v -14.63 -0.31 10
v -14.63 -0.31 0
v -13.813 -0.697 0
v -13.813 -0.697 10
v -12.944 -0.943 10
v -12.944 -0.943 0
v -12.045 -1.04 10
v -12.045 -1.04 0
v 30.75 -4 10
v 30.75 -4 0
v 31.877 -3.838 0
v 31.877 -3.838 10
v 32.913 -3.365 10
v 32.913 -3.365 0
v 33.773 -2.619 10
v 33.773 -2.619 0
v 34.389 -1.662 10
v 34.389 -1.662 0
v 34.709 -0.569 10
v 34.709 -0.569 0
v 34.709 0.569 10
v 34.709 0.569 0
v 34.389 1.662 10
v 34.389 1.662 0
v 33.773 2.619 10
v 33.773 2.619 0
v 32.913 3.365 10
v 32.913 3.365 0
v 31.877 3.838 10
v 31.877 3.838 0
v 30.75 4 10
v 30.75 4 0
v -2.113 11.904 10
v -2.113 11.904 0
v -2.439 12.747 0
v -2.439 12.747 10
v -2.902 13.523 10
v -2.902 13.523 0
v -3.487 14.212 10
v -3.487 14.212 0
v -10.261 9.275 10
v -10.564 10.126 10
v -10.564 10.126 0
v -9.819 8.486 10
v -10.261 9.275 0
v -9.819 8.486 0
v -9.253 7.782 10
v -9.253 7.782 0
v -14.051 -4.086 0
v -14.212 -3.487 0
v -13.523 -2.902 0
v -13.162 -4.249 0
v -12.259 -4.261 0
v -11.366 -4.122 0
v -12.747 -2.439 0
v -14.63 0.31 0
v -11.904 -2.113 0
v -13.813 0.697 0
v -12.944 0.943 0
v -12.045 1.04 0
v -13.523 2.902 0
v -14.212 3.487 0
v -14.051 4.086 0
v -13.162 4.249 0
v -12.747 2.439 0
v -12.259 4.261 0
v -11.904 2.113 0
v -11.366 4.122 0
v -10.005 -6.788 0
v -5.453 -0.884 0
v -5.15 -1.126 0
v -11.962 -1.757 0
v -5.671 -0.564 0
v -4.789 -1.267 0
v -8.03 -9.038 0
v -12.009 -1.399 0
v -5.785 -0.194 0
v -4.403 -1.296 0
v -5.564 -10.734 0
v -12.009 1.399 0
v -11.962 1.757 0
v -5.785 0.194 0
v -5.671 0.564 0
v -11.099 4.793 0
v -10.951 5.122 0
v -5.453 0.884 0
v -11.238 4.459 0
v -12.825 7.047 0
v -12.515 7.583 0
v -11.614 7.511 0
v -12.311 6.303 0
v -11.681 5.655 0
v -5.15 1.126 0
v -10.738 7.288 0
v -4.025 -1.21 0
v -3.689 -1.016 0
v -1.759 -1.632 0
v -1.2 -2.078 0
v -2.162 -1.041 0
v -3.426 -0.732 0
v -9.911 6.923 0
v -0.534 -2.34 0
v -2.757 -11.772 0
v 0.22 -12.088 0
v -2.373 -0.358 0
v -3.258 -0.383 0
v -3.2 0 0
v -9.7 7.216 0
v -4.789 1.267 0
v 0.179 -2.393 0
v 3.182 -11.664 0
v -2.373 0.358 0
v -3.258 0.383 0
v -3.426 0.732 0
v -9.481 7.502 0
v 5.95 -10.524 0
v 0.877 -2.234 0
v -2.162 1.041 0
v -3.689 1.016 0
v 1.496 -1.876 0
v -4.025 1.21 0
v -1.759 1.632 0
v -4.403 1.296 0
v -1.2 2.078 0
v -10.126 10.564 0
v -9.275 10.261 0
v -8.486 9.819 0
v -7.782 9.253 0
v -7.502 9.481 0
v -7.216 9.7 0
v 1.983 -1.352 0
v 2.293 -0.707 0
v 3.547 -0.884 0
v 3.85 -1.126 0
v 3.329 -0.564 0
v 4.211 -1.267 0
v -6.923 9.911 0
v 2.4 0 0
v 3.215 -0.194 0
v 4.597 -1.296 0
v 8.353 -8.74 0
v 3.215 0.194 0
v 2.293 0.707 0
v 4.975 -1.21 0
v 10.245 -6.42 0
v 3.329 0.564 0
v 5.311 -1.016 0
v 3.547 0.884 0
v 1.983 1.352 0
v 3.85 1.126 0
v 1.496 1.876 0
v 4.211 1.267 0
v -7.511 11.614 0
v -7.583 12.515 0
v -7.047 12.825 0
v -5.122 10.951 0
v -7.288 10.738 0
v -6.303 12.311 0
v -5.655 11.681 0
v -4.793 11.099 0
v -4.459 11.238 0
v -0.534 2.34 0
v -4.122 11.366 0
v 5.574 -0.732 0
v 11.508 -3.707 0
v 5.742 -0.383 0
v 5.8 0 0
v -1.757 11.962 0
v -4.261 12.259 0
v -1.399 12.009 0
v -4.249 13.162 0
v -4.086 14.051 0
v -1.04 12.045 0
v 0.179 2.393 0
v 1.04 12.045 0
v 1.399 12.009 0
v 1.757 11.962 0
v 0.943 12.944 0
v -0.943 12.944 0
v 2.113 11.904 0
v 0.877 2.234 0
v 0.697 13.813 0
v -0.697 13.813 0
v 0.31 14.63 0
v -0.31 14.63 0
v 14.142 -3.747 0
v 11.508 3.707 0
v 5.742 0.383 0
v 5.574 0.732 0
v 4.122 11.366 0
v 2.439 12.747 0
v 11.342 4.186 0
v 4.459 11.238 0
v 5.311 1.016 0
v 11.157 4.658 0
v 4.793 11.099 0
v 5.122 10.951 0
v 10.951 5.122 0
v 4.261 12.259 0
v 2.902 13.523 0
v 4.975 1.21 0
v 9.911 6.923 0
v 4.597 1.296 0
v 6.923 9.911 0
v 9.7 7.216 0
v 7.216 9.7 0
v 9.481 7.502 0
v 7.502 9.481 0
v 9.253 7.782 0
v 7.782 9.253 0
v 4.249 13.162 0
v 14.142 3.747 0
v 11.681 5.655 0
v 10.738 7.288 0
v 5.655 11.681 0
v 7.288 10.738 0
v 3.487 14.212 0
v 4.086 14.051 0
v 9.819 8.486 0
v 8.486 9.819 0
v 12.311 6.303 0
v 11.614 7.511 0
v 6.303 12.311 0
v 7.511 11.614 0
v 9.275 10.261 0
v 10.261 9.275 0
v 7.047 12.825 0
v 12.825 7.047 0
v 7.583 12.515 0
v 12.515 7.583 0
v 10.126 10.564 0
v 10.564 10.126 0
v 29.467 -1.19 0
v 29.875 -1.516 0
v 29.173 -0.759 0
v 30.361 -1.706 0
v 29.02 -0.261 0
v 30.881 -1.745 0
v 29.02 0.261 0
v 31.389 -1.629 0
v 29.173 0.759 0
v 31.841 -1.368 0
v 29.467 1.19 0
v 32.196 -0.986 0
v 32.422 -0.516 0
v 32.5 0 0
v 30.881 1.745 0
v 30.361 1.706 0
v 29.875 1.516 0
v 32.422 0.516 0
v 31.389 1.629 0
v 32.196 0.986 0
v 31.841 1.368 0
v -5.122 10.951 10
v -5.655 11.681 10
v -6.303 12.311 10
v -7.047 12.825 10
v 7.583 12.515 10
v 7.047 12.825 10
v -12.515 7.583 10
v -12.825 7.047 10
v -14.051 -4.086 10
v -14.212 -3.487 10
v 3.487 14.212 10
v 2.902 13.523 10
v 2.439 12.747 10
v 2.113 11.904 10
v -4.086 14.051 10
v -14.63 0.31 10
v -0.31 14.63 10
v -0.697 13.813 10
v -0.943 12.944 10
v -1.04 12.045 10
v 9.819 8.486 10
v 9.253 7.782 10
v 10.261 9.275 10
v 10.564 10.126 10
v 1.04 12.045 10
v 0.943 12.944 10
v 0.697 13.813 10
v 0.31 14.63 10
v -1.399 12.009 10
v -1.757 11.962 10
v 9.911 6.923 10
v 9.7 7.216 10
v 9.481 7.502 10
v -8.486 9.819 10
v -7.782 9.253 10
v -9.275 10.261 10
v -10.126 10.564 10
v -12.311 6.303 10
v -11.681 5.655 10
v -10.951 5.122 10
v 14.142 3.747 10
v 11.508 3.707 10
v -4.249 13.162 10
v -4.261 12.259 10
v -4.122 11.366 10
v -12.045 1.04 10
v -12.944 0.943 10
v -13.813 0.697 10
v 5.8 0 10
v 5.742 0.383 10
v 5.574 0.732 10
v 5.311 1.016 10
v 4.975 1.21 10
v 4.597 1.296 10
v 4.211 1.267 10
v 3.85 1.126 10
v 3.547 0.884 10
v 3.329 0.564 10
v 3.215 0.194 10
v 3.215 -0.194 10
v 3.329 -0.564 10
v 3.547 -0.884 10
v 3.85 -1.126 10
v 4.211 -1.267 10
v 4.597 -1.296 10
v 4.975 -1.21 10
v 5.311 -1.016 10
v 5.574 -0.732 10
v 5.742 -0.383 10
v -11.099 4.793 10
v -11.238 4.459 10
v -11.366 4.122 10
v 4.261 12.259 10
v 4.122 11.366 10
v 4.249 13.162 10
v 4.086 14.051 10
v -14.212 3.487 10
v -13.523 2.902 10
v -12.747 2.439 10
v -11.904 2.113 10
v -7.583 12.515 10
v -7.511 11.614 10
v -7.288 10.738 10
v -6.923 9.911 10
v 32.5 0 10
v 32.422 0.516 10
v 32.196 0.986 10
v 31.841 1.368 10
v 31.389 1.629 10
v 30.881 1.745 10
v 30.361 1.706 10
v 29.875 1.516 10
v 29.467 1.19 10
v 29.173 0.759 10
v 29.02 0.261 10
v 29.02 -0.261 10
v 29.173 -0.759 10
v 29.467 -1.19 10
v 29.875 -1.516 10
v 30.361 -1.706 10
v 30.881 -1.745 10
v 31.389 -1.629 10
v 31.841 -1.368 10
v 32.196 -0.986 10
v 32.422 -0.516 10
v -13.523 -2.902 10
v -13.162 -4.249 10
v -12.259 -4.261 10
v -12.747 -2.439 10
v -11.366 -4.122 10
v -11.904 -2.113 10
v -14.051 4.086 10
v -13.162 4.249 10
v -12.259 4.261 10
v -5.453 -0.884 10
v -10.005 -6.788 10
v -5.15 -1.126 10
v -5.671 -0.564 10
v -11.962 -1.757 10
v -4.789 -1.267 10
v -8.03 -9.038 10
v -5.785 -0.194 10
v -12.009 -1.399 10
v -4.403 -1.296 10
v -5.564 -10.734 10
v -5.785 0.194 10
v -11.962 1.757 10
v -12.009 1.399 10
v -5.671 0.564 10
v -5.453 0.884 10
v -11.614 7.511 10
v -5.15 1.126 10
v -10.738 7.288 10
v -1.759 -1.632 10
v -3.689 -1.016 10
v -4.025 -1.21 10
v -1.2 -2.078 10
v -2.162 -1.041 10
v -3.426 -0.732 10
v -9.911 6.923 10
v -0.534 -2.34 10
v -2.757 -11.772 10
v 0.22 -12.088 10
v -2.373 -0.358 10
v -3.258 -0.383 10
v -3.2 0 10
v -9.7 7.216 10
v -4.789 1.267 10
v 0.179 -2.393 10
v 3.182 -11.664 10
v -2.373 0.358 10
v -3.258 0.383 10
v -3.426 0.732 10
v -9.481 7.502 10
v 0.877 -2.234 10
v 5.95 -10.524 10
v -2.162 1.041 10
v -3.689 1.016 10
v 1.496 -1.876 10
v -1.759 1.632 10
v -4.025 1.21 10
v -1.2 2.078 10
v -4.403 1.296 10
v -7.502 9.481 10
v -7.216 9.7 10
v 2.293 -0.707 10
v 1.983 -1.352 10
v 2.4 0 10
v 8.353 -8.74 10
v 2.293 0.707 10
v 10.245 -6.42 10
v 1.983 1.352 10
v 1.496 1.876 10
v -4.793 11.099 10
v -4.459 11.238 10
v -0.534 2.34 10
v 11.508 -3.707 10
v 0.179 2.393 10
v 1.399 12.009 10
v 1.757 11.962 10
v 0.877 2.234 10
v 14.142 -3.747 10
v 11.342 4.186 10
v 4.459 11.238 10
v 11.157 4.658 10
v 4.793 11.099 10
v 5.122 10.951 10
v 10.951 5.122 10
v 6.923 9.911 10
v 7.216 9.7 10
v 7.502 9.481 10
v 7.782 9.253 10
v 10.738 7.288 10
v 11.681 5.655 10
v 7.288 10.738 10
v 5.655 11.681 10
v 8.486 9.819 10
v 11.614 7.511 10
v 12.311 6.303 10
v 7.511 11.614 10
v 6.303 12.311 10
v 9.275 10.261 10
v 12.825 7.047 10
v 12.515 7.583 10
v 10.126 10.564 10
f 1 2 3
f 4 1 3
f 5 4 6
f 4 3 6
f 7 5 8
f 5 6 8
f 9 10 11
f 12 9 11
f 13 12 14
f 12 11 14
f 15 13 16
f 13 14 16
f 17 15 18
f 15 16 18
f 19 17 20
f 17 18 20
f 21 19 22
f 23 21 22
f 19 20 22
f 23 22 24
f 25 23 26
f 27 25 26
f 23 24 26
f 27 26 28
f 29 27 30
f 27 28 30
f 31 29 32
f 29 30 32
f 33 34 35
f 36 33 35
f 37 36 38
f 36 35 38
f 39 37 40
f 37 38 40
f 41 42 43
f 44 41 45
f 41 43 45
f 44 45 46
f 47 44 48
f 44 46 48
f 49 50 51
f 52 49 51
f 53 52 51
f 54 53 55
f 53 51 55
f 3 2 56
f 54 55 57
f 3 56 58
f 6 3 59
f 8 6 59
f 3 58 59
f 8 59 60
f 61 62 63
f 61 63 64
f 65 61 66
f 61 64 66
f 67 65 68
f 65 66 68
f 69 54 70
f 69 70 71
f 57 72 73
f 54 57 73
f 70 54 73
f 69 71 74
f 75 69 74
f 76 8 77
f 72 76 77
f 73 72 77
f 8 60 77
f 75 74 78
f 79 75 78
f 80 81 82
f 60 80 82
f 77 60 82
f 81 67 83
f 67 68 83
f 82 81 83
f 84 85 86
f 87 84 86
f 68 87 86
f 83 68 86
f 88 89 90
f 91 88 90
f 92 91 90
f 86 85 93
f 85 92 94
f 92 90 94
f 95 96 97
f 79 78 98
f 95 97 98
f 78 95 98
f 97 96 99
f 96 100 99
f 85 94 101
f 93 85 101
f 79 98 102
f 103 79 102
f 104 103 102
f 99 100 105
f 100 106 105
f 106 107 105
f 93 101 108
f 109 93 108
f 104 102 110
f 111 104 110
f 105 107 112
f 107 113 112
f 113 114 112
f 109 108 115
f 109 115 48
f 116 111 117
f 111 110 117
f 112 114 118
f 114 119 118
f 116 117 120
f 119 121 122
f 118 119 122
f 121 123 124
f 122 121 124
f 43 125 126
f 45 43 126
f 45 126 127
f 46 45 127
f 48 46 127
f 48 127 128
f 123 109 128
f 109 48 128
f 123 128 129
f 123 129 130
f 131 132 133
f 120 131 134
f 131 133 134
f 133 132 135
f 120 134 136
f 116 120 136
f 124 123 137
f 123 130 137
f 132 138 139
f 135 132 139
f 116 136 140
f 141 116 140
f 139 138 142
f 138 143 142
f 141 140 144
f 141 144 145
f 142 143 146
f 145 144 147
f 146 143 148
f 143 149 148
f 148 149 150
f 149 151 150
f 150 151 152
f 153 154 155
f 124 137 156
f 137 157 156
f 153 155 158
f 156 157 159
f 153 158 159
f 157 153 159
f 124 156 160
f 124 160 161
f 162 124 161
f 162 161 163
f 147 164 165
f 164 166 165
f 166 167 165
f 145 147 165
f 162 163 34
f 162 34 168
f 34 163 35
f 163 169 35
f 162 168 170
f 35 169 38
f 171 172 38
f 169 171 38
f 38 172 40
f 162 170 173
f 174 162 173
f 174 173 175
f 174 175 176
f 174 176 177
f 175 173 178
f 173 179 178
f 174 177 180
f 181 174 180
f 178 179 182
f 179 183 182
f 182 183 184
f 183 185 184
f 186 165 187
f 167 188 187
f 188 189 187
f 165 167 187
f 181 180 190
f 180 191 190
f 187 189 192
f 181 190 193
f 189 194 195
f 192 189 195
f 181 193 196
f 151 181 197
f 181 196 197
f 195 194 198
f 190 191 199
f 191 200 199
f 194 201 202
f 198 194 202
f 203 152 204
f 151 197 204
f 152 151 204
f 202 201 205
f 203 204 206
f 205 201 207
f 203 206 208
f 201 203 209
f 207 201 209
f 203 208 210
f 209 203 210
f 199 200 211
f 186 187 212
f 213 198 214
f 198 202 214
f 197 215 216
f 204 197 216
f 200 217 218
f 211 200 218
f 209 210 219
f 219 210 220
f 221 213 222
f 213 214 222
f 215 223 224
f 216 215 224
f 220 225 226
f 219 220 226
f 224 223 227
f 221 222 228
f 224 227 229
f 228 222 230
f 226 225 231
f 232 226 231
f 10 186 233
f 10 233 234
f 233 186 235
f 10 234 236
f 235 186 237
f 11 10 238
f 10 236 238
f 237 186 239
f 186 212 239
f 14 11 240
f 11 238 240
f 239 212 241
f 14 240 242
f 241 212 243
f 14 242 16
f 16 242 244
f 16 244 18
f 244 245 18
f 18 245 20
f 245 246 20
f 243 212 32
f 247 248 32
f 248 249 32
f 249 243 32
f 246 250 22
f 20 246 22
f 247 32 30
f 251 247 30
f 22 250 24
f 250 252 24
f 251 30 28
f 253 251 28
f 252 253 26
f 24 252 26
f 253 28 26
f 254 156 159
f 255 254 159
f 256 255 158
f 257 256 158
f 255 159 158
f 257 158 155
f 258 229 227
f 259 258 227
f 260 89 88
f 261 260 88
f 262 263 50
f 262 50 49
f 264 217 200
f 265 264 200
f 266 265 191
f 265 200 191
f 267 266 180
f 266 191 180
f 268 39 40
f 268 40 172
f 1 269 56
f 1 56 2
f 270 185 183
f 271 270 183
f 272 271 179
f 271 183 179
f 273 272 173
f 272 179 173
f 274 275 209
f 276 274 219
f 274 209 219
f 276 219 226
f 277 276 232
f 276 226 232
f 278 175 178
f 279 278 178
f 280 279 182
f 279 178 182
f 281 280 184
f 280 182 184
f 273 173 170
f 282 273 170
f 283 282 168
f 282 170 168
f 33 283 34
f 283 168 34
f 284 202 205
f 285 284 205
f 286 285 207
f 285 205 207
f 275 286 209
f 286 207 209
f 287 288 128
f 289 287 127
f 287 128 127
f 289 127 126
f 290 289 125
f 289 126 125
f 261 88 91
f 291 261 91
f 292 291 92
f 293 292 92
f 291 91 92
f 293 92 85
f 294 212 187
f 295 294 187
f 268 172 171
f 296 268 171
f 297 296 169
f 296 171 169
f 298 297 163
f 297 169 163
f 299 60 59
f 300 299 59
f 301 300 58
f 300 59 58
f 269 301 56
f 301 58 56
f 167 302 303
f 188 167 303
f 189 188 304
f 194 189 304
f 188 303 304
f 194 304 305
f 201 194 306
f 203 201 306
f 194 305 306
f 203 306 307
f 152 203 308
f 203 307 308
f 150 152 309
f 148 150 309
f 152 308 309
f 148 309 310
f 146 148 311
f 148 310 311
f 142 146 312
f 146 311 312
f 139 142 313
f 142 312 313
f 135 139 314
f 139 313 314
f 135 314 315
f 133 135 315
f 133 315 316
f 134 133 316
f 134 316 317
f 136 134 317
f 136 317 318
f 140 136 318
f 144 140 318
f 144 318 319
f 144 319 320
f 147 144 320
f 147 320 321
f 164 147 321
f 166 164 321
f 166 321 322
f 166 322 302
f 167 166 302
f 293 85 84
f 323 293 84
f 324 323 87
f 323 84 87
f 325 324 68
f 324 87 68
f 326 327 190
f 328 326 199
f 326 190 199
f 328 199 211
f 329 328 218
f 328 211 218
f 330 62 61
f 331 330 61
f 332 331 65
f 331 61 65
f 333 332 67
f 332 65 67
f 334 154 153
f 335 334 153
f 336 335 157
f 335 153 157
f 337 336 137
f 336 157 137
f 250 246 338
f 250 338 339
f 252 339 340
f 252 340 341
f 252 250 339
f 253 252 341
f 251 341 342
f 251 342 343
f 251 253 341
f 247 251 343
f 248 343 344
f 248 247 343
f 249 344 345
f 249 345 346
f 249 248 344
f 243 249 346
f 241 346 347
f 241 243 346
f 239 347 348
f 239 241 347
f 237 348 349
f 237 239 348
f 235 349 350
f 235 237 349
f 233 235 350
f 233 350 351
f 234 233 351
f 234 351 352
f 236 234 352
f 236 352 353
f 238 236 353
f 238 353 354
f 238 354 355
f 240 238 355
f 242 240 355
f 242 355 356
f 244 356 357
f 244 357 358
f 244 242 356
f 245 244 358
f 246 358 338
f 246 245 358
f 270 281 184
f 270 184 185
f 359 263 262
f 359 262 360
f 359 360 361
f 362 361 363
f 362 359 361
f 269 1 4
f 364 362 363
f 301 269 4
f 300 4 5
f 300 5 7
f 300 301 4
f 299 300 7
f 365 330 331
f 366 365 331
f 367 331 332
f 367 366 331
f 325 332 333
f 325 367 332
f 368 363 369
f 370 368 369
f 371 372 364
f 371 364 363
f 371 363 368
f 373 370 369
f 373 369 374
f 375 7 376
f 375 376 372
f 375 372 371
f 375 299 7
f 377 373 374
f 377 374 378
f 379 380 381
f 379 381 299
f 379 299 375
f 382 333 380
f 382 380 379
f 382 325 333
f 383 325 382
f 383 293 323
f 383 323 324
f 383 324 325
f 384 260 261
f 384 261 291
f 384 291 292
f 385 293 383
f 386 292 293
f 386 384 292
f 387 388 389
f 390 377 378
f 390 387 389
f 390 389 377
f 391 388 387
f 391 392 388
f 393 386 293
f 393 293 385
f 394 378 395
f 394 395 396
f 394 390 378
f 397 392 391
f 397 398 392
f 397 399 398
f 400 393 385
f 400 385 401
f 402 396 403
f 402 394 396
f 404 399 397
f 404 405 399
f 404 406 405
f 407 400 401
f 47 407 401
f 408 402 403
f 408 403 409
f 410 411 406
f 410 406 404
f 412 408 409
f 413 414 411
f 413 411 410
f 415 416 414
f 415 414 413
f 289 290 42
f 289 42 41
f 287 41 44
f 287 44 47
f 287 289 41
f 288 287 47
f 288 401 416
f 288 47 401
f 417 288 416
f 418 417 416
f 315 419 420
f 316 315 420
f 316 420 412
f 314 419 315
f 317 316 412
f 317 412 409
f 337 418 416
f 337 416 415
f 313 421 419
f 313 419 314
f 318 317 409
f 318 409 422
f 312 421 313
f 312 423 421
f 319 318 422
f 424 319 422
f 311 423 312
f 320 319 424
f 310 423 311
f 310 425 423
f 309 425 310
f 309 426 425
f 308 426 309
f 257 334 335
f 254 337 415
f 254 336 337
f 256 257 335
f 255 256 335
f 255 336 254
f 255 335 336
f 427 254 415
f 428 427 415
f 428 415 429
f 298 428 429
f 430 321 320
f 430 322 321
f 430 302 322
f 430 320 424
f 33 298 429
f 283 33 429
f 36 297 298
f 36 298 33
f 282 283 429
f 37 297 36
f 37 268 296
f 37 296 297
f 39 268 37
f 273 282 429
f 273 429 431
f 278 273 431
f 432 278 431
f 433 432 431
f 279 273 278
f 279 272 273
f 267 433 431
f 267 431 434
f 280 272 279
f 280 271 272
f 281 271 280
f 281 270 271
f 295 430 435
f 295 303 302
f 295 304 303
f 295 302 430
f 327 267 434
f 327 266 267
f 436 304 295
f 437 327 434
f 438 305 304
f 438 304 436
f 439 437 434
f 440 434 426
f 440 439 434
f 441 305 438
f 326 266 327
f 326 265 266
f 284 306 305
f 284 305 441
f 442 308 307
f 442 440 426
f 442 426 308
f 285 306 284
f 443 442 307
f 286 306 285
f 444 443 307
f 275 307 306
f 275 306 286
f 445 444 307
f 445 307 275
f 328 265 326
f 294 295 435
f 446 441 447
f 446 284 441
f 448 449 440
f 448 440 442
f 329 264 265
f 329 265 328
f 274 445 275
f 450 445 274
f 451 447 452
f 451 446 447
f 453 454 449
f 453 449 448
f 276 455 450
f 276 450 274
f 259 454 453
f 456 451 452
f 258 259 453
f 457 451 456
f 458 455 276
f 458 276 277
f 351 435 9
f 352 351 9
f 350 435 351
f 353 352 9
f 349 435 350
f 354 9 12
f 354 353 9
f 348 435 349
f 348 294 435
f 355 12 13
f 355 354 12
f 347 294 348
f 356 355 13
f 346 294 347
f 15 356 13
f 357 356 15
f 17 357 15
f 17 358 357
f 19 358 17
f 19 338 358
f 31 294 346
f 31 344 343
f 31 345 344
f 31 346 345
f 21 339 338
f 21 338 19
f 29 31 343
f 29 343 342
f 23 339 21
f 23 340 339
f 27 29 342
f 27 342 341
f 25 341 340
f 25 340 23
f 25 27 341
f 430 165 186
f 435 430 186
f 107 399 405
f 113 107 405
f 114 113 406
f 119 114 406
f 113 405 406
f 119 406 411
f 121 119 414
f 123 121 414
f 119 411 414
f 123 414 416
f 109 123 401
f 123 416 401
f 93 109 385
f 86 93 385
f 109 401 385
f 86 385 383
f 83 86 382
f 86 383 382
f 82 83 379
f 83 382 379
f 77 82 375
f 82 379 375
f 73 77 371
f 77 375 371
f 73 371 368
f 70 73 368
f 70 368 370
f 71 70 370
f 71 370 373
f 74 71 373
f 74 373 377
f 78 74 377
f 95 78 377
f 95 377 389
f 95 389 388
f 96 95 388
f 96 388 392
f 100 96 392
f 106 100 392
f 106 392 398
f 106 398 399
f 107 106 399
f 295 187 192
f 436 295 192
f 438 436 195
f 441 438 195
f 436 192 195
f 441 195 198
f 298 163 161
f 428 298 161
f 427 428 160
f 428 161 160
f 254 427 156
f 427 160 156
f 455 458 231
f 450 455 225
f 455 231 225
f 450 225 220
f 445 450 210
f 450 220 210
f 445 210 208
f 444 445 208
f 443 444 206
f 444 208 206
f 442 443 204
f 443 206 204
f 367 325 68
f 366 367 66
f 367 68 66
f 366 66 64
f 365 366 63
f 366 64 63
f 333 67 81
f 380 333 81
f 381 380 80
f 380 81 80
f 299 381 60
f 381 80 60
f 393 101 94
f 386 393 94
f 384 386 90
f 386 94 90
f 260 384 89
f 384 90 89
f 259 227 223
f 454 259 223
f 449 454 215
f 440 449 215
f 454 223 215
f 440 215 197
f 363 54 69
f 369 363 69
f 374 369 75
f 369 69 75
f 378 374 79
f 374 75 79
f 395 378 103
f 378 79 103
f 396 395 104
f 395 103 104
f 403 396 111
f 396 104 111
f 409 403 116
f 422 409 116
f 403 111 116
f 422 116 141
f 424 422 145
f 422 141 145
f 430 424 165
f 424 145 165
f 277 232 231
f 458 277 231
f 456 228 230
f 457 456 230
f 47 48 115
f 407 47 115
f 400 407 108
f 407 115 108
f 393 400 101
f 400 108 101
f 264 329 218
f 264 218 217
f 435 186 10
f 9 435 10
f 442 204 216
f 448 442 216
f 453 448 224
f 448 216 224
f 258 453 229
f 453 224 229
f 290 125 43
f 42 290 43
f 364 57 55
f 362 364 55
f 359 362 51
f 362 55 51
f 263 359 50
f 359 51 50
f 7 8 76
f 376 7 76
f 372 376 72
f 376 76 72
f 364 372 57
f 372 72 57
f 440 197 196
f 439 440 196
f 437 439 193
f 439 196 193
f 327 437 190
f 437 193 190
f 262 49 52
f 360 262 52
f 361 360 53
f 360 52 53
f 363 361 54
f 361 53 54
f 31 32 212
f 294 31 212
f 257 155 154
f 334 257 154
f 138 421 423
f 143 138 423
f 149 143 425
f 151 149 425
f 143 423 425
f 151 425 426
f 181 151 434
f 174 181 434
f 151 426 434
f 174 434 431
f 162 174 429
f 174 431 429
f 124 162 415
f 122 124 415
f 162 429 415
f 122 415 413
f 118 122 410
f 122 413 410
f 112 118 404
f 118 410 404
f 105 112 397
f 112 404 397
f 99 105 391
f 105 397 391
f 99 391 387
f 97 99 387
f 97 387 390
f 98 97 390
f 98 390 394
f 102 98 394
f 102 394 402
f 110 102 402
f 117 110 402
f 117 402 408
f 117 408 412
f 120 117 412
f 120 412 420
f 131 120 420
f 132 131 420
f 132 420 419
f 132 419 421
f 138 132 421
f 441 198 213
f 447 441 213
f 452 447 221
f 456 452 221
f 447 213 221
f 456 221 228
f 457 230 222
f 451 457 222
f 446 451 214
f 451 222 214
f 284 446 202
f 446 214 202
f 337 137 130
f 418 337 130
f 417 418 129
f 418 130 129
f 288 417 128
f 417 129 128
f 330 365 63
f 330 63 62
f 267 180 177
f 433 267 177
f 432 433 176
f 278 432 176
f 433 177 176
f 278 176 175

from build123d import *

# Parameters (mm, degrees)
SKETCH1_R           = 12.09
SKETCH1_R_2         = 1.75
BOSS_EXTRUDE1_DEPTH = 10
SKETCH2_R           = 2.4
SKETCH2_R_2         = 1.3
CUT_EXTRUDE1_DEPTH  = 40.007683858


with BuildPart() as part:
    # Sketch1 → Boss-Extrude1 (new body)
    # profile 1 of 17: a face of its own
    with BuildSketch(Plane.XY):
        Circle(SKETCH1_R)
        Circle(SKETCH1_R_2, mode=Mode.SUBTRACT)
    # profile 2 of 17: a face of its own
    with BuildSketch(Plane.XY):
        with BuildLine():
            Line((30.75, 4), (14.142164609, 3.746702505))
            Line((14.142164609, 3.746702505), (14.211728743, 3.487085624))
            ThreePointArc((14.211728743, 3.487085624), (13.144626757, 2.65424773), (11.903927815, 2.112960617))
            ThreePointArc((11.903927815, 2.112960617), (11.986568374, 1.578061664), (12.04518576, 1.04))
            ThreePointArc((12.04518576, 1.04), (13.383704325, 0.838273314), (14.63, 0.31))
            Line((14.63, 0.31), (14.63, -0.31))
            ThreePointArc((14.63, -0.31), (13.383704325, -0.838273314), (12.04518576, -1.04))
            ThreePointArc((12.04518576, -1.04), (11.986568374, -1.578061664), (11.903927815, -2.112960617))
            ThreePointArc((11.903927815, -2.112960617), (13.144626757, -2.65424773), (14.211728743, -3.487085624))
            Line((14.211728743, -3.487085624), (14.142164609, -3.746702505))
            Line((14.142164609, -3.746702505), (30.75, -4))
            ThreePointArc((30.75, -4), (34.75, 0), (30.75, 4))
        make_face()
        with Locations((30.75, 0)):
            Circle(SKETCH1_R_2, mode=Mode.SUBTRACT)
    # profile 3 of 17: a face of its own
    with BuildSketch(Plane.XY):
        with BuildLine():
            ThreePointArc((-11.365584201, -4.122086336), (-11.67804324, -3.129122255), (-11.903927815, -2.112960617))
            ThreePointArc((-11.903927815, -2.112960617), (-13.144626757, -2.65424773), (-14.211728743, -3.487085624))
            Line((-14.211728743, -3.487085624), (-14.051260935, -4.085959636))
            ThreePointArc((-14.051260935, -4.085959636), (-12.71070456, -4.273667417), (-11.365584201, -4.122086336))
        make_face()
    # profile 4 of 17: a face of its own
    with BuildSketch(Plane.XY):
        with BuildLine():
            ThreePointArc((-12.04518576, -1.04), (-12.09, 0), (-12.04518576, 1.04))
            ThreePointArc((-12.04518576, 1.04), (-13.383704325, 0.838273314), (-14.63, 0.31))
            Line((-14.63, 0.31), (-14.63, -0.31))
            ThreePointArc((-14.63, -0.31), (-13.383704325, -0.838273314), (-12.04518576, -1.04))
        make_face()
    # profile 5 of 17: a face of its own
    with BuildSketch(Plane.XY):
        with BuildLine():
            ThreePointArc((-11.903927815, 2.112960617), (-11.67804324, 3.129122255), (-11.365584201, 4.122086336))
            ThreePointArc((-11.365584201, 4.122086336), (-12.71070456, 4.273667417), (-14.051260935, 4.085959636))
            Line((-14.051260935, 4.085959636), (-14.211728743, 3.487085624))
            ThreePointArc((-14.211728743, 3.487085624), (-13.144626757, 2.65424773), (-11.903927815, 2.112960617))
        make_face()
    # profile 6 of 17: a face of its own
    with BuildSketch(Plane.XY):
        with BuildLine():
            ThreePointArc((-10.951436862, 5.12192646), (-10.470247132, 6.045), (-9.911436862, 6.9232593))
            ThreePointArc((-9.911436862, 6.9232593), (-11.171491285, 7.417818147), (-12.514951657, 7.583467875))
            Line((-12.514951657, 7.583467875), (-12.824951657, 7.046532125))
            ThreePointArc((-12.824951657, 7.046532125), (-12.009764599, 5.965886177), (-10.951436862, 5.12192646))
        make_face()
    # profile 7 of 17: a face of its own
    with BuildSketch(Plane.XY):
        with BuildLine():
            ThreePointArc((-9.252623584, 7.781841479), (-8.548920985, 8.548920985), (-7.781841479, 9.252623584))
            ThreePointArc((-7.781841479, 9.252623584), (-8.870959341, 10.05645683), (-10.125769107, 10.564175311))
            Line((-10.125769107, 10.564175311), (-10.564175311, 10.125769107))
            ThreePointArc((-10.564175311, 10.125769107), (-10.05645683, 8.870959341), (-9.252623584, 7.781841479))
        make_face()
    # profile 8 of 17: a face of its own
    with BuildSketch(Plane.XY):
        with BuildLine():
            ThreePointArc((-6.9232593, 9.911436862), (-6.045, 10.470247132), (-5.12192646, 10.951436862))
            ThreePointArc((-5.12192646, 10.951436862), (-5.965886177, 12.009764599), (-7.046532125, 12.824951657))
            Line((-7.046532125, 12.824951657), (-7.583467875, 12.514951657))
            ThreePointArc((-7.583467875, 12.514951657), (-7.417818147, 11.171491285), (-6.9232593, 9.911436862))
        make_face()
    # profile 9 of 17: a face of its own
    with BuildSketch(Plane.XY):
        with BuildLine():
            ThreePointArc((-4.122086336, 11.365584201), (-3.129122255, 11.67804324), (-2.112960617, 11.903927815))
            ThreePointArc((-2.112960617, 11.903927815), (-2.65424773, 13.144626757), (-3.487085624, 14.211728743))
            Line((-3.487085624, 14.211728743), (-4.085959636, 14.051260935))
            ThreePointArc((-4.085959636, 14.051260935), (-4.273667417, 12.71070456), (-4.122086336, 11.365584201))
        make_face()
    # profile 10 of 17: a face of its own
    with BuildSketch(Plane.XY):
        with BuildLine():
            Line((0.31, 14.63), (-0.31, 14.63))
            ThreePointArc((-0.31, 14.63), (-0.838273314, 13.383704325), (-1.04, 12.04518576))
            ThreePointArc((-1.04, 12.04518576), (0, 12.09), (1.04, 12.04518576))
            ThreePointArc((1.04, 12.04518576), (0.838273314, 13.383704325), (0.31, 14.63))
        make_face()
    # profile 11 of 17: a face of its own
    with BuildSketch(Plane.XY):
        with BuildLine():
            ThreePointArc((3.487085624, 14.211728743), (2.65424773, 13.144626757), (2.112960617, 11.903927815))
            ThreePointArc((2.112960617, 11.903927815), (3.129122255, 11.67804324), (4.122086336, 11.365584201))
            ThreePointArc((4.122086336, 11.365584201), (4.273667417, 12.71070456), (4.085959636, 14.051260935))
            Line((4.085959636, 14.051260935), (3.487085624, 14.211728743))
        make_face()
    # profile 12 of 17: a face of its own
    with BuildSketch(Plane.XY):
        with BuildLine():
            ThreePointArc((7.046532125, 12.824951657), (5.965886177, 12.009764599), (5.12192646, 10.951436862))
            ThreePointArc((5.12192646, 10.951436862), (6.045, 10.470247132), (6.9232593, 9.911436862))
            ThreePointArc((6.9232593, 9.911436862), (7.417818147, 11.171491285), (7.583467875, 12.514951657))
            Line((7.583467875, 12.514951657), (7.046532125, 12.824951657))
        make_face()
    # profile 13 of 17: a face of its own
    with BuildSketch(Plane.XY):
        with BuildLine():
            ThreePointArc((10.125769107, 10.564175311), (8.870959341, 10.05645683), (7.781841479, 9.252623584))
            ThreePointArc((7.781841479, 9.252623584), (8.548920985, 8.548920985), (9.252623584, 7.781841479))
            ThreePointArc((9.252623584, 7.781841479), (10.05645683, 8.870959341), (10.564175311, 10.125769107))
            Line((10.564175311, 10.125769107), (10.125769107, 10.564175311))
        make_face()
    # profile 14 of 17: a face of its own
    with BuildSketch(Plane.XY):
        with BuildLine():
            ThreePointArc((12.514951657, 7.583467875), (11.171491285, 7.417818147), (9.911436862, 6.9232593))
            ThreePointArc((9.911436862, 6.9232593), (10.470247132, 6.045), (10.951436862, 5.12192646))
            ThreePointArc((10.951436862, 5.12192646), (12.009764599, 5.965886177), (12.824951657, 7.046532125))
            Line((12.824951657, 7.046532125), (12.514951657, 7.583467875))
        make_face()
    # profile 15 of 17: a face of its own
    with BuildSketch(Plane.XY):
        with BuildLine():
            Line((14.142164609, 3.746702505), (11.507813792, 3.706524213))
            ThreePointArc((11.507813792, 3.706524213), (11.732956682, 2.916475184), (11.903927815, 2.112960617))
            ThreePointArc((11.903927815, 2.112960617), (13.144626757, 2.65424773), (14.211728743, 3.487085624))
            Line((14.211728743, 3.487085624), (14.142164609, 3.746702505))
        make_face()
    # profile 16 of 17: a face of its own
    with BuildSketch(Plane.XY):
        with BuildLine():
            ThreePointArc((14.63, 0.31), (13.383704325, 0.838273314), (12.04518576, 1.04))
            ThreePointArc((12.04518576, 1.04), (12.078791244, 0.520482544), (12.09, 0))
            ThreePointArc((12.09, 0), (12.078791244, -0.520482544), (12.04518576, -1.04))
            ThreePointArc((12.04518576, -1.04), (13.383704325, -0.838273314), (14.63, -0.31))
            Line((14.63, -0.31), (14.63, 0.31))
        make_face()
    # profile 17 of 17: a face of its own
    with BuildSketch(Plane.XY):
        with BuildLine():
            Line((11.507813792, -3.706524213), (14.142164609, -3.746702505))
            Line((14.142164609, -3.746702505), (14.211728743, -3.487085624))
            ThreePointArc((14.211728743, -3.487085624), (13.144626757, -2.65424773), (11.903927815, -2.112960617))
            ThreePointArc((11.903927815, -2.112960617), (11.732956682, -2.916475184), (11.507813792, -3.706524213))
        make_face()
    extrude(amount=BOSS_EXTRUDE1_DEPTH)

    # Sketch2 → Cut-Extrude1 (cut, through all)
    with BuildSketch(Plane.XY.offset(10)):
        Circle(SKETCH2_R)
        with Locations((4.5, 0)):
            Circle(SKETCH2_R_2)
        with Locations((-4.5, 0)):
            Circle(SKETCH2_R_2)
    extrude(amount=-CUT_EXTRUDE1_DEPTH, mode=Mode.SUBTRACT)


solid = part.part
